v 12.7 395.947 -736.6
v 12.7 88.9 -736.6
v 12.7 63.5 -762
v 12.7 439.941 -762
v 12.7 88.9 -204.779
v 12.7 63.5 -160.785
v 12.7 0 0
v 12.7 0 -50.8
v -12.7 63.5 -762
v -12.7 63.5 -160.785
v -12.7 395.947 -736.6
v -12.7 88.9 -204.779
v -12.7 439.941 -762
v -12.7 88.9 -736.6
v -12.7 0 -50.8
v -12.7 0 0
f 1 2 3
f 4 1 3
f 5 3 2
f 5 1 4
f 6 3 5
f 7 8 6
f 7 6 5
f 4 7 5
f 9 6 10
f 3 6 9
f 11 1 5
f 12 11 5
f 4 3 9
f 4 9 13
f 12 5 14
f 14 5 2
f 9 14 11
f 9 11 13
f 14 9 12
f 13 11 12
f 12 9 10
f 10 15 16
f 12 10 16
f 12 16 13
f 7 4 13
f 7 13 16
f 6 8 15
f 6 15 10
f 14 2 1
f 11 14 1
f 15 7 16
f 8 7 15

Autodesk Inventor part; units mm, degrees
ref_plane "YZ Plane" through (0, 0, 0) normal (1, 0, 0) x (0, 1, 0)
ref_plane "XZ Plane" through (0, 0, 0) normal (0, 1, 0) x (-1, 0, 0)
sketch "Sketch1" plane through (0, 0, 0) normal (1, 0, 0) x (0, 1, 0)
  line L0 (0, 0) -> (0, -762)
  line L1 (0, -762) -> (439.9409, -762)
  line L2 (439.9409, -762) -> (0, 0)
  line L3 (25.4, -129.7892) -> (25.4, -736.6)
  line L4 (25.4, -736.6) -> (361.7607, -736.6)
  line L5 (361.7607, -736.6) -> (25.4, -129.7892)
  dimension "d0" = 762
  dimension "d5" = 30
  dimension "d6" = 1
  dimension "d7" = 25.4
  dimension "d8" = 25.4
extrude "Extrusion1" add sketch "Sketch1" along normal mid plane 25.4 contours L2 L1 L0 | L5 L4 L3
ref_plane "Work Plane1" through (-12.7, 65.9911, 38.1) normal (0, 0.866, 0.5) x (1, 0, 0)
sketch "Sketch3" plane through (12.7, 0, 0) normal (1, 0, 0) x (0, 0, -1)
  line L0 (0, 63.5) -> (873.76, 63.5) projected
  line L1 (204.7793, 88.9) -> (736.6, 88.9)
  line L2 (736.6, 88.9) -> (736.6, 395.9468)
  line L3 (736.6, 395.9468) -> (204.7793, 88.9)
  line L4 (762, 439.9409) -> (0, 0) projected
  line L5 (762, 0) -> (762, 439.9409) projected
  line L6 (0, 0) -> (762, 0) projected
  line L7 (50.8, 0) -> (160.7852, 63.5)
  line L8 (160.7852, 63.5) -> (762, 63.5)
  line L9 (762, 0) -> (50.8, 0)
  dimension "d14" = 25.4
  dimension "d15" = 25.4
  dimension "d21" = 25.4
extrude "Extrusion4" cut sketch "Sketch3" against normal through all contours L0 L5 L6 L7 | L3 L2 L1
properties part number "ballSupport" material "Aluminum 6061, Welded"
